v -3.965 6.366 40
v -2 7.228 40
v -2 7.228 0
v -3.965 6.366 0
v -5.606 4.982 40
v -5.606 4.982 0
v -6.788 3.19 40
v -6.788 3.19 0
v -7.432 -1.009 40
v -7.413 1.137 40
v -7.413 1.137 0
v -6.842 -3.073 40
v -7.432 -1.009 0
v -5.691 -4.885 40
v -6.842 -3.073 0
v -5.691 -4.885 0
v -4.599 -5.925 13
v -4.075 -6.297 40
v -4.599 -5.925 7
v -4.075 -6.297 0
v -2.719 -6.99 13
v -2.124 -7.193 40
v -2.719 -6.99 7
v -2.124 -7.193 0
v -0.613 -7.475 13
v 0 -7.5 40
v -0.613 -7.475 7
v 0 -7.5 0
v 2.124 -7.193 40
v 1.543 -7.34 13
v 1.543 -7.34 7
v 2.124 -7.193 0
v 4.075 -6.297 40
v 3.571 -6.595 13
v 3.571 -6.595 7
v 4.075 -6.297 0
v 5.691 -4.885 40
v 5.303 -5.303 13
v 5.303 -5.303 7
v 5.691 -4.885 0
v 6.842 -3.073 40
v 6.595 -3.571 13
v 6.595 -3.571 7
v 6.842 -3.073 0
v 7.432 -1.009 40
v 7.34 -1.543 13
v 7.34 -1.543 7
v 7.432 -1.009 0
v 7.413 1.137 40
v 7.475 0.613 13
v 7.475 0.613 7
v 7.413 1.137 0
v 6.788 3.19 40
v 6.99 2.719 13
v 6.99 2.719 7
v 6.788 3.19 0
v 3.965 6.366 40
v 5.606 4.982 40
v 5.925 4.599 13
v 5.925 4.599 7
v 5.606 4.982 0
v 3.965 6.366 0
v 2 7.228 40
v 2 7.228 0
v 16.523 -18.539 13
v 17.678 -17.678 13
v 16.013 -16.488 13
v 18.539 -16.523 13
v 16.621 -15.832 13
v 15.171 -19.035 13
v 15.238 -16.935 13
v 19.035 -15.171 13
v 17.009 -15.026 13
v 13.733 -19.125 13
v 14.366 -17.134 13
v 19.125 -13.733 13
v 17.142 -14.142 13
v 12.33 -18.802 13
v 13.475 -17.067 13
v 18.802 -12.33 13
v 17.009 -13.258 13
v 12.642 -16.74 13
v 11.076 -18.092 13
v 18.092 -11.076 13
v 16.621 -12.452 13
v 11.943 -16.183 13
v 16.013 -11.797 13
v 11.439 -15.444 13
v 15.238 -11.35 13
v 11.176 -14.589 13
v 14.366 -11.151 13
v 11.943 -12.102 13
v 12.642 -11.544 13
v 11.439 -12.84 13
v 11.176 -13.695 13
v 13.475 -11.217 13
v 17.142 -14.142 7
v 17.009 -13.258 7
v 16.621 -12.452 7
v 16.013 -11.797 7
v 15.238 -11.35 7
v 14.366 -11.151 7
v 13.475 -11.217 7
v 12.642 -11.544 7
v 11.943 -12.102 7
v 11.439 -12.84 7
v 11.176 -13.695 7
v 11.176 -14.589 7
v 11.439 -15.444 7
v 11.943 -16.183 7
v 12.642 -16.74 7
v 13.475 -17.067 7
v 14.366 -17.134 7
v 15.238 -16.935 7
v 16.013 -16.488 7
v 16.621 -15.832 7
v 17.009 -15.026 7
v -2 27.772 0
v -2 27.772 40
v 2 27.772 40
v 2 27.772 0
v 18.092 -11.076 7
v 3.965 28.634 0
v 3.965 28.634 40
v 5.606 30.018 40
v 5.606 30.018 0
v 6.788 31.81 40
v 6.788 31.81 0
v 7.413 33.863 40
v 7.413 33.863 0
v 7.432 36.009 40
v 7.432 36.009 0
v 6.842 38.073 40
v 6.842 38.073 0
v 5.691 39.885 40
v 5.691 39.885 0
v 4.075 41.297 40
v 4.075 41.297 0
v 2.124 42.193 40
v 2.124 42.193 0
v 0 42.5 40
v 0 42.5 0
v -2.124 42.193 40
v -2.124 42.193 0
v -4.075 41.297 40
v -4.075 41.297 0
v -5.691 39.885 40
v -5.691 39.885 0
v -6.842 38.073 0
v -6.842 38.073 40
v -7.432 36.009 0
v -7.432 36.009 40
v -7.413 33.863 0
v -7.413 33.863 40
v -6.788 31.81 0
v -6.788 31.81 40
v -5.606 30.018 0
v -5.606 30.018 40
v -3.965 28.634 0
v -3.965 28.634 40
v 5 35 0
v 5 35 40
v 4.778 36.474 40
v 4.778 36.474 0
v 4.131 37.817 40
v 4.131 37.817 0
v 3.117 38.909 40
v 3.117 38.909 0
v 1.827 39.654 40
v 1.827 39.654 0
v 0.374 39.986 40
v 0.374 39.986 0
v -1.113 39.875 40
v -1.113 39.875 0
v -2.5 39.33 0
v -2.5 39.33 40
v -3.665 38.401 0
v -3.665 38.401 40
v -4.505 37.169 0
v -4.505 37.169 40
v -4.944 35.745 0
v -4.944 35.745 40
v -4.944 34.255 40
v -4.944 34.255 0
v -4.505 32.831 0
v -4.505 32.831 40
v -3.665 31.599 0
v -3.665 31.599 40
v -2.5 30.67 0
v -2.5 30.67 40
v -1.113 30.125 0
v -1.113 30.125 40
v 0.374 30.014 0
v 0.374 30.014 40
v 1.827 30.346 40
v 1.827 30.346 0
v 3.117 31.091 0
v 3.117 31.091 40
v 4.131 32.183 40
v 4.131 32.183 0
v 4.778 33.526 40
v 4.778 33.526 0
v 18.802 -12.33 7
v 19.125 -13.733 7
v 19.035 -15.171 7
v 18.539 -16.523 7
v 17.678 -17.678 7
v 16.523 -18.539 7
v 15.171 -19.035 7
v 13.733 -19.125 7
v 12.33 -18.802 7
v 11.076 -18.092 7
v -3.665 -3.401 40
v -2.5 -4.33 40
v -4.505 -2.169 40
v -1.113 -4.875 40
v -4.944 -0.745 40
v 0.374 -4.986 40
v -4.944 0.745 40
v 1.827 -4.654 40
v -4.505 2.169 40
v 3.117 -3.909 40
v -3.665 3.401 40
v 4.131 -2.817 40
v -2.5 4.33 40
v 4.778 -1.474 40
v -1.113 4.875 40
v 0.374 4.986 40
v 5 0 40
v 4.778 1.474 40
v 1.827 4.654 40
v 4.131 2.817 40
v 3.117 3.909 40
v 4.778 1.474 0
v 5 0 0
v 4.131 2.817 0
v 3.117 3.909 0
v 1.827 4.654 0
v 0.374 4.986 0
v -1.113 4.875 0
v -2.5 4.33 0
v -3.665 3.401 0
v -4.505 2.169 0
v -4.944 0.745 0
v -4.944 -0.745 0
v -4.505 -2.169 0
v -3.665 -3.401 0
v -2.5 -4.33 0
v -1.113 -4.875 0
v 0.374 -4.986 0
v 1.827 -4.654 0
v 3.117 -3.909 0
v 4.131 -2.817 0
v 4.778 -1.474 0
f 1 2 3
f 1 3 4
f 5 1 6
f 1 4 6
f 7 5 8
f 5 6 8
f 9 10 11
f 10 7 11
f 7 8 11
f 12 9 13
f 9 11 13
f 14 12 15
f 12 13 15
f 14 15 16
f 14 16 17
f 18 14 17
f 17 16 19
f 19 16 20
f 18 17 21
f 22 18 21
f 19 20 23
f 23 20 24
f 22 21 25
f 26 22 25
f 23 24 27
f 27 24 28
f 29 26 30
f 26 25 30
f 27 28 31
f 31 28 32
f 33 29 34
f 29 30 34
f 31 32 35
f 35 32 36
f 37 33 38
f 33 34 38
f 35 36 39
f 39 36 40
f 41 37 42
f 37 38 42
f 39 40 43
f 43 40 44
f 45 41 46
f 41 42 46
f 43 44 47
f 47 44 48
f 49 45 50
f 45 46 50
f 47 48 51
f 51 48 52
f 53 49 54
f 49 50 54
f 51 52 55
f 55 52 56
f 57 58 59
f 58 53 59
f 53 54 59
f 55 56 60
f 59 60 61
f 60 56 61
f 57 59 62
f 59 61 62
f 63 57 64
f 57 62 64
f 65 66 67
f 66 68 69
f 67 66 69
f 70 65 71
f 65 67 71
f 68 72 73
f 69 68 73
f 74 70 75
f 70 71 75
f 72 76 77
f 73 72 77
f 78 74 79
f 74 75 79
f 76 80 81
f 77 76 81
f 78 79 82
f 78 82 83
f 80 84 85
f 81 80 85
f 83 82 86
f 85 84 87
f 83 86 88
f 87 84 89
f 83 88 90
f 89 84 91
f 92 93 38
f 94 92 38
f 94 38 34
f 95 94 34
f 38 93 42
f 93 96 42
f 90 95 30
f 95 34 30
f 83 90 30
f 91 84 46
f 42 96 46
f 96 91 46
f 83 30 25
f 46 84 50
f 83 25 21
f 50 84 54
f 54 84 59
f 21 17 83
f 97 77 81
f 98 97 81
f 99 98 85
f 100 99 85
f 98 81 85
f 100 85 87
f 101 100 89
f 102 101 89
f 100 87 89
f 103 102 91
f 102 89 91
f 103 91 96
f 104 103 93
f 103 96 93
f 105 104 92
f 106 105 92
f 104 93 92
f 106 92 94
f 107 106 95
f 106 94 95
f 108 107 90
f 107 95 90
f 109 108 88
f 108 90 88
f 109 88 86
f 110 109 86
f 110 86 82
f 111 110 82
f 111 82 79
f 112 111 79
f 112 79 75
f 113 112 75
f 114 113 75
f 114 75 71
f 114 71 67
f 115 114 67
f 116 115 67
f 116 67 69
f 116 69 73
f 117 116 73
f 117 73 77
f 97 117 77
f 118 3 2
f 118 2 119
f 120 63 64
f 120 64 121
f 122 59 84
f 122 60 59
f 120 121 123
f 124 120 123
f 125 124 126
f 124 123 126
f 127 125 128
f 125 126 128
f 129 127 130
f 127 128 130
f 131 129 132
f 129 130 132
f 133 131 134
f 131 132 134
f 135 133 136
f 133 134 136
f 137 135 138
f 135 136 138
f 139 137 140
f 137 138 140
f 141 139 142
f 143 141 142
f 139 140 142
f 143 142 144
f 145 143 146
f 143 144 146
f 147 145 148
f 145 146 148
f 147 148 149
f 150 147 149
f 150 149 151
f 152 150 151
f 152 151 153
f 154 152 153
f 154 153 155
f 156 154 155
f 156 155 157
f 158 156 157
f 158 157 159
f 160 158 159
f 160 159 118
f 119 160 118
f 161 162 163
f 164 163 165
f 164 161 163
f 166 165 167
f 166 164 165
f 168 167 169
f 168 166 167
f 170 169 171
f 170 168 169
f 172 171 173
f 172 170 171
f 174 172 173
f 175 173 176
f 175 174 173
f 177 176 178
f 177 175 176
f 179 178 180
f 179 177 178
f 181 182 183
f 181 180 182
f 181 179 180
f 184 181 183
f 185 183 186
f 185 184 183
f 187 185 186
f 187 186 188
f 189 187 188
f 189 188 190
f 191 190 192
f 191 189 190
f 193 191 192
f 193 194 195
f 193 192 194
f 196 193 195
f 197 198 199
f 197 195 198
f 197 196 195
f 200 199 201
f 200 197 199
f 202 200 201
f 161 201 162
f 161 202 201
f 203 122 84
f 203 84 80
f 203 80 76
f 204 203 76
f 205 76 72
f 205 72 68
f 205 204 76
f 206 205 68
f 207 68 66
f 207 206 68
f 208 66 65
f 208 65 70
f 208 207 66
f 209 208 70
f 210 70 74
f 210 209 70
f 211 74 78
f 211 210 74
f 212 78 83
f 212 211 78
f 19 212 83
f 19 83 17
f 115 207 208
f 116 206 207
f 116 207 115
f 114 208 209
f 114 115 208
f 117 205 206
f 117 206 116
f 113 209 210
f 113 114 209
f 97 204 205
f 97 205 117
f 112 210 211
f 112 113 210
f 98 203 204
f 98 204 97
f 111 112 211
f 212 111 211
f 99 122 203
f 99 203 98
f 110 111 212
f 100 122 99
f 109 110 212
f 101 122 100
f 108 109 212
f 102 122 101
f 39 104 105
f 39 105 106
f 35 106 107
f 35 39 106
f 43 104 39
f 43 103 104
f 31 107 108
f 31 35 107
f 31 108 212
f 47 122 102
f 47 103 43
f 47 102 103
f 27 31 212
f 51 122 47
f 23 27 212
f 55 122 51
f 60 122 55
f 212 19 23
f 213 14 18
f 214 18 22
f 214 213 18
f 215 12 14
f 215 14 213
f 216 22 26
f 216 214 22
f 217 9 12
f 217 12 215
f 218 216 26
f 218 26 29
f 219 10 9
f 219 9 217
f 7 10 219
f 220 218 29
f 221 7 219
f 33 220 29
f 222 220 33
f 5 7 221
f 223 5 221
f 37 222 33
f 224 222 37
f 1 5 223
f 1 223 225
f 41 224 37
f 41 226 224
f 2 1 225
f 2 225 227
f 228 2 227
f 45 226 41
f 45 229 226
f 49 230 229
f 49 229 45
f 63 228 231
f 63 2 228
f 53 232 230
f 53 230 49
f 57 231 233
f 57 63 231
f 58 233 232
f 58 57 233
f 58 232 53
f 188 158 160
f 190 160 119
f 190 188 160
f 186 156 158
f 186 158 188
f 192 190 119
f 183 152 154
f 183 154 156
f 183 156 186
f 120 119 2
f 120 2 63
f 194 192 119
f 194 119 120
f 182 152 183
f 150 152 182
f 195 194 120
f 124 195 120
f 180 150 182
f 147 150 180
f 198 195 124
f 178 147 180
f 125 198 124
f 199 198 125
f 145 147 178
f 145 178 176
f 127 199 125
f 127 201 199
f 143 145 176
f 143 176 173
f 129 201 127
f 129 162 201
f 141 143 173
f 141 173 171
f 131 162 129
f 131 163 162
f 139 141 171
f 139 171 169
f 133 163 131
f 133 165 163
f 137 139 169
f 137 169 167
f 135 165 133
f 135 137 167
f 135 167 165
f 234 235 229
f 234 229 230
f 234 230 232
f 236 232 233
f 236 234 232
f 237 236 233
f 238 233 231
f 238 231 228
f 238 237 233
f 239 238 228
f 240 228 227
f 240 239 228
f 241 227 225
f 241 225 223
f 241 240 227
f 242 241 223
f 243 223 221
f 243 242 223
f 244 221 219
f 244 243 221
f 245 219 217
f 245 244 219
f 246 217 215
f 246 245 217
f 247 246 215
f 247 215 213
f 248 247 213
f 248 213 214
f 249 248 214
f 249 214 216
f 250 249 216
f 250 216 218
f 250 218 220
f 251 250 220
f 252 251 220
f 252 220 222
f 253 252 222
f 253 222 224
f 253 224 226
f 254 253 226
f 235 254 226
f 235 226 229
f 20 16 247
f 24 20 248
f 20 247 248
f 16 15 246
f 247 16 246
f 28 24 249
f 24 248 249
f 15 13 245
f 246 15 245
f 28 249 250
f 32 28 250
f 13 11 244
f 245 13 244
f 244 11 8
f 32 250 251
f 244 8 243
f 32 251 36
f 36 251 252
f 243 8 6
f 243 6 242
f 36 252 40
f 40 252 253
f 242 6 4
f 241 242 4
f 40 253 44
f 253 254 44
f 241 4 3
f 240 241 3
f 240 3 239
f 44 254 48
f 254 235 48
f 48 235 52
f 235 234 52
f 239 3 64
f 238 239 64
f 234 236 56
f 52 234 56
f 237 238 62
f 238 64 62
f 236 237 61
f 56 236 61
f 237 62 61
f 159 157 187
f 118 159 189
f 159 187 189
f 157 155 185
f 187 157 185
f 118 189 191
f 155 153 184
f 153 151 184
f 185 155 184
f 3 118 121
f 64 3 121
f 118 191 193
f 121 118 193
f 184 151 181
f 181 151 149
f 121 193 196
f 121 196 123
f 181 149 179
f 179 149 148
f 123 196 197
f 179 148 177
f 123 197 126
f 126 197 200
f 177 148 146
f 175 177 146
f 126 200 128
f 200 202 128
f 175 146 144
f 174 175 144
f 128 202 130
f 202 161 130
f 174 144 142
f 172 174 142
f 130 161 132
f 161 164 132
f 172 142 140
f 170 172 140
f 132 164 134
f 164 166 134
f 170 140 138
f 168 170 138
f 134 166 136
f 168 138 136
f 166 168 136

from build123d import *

# Parameters (mm, degrees)
SKETCH_1_R          = 7.5
SKETCH_1_R_2        = 5
SKETCH_1_W          = 4
SKETCH_1_H          = 25
EXTRUDE_1_DEPTH     = 40
SKETCH_3_R          = 5
EXTRUDE_2_DEPTH     = 3
SKETCH_4_R          = 3
CUT_EXTRUDE_2_DEPTH = 54.867163989


with BuildPart() as part:
    # Эскиз1 → Бобышка-Вытянуть1 (new body)
    # profile 1 of 3: a face of its own
    with BuildSketch(Plane.XY):
        Circle(SKETCH_1_R)
        Circle(SKETCH_1_R_2, mode=Mode.SUBTRACT)
    # profile 2 of 3: a face of its own
    with BuildSketch(Plane.XY):
        with Locations((0, 35)):
            Circle(SKETCH_1_R)
        with Locations((0, 35)):
            Circle(SKETCH_1_R_2, mode=Mode.SUBTRACT)
    # profile 3 of 3: a face of its own
    with BuildSketch(Plane.XY):
        with Locations((0, 17.5)):
            Rectangle(SKETCH_1_W, SKETCH_1_H)
    extrude(amount=EXTRUDE_1_DEPTH)

    # Эскиз3 → Бобышка-Вытянуть2 (add, symmetric)
    with BuildSketch(Plane(origin=(0, 0, 10), x_dir=(-1, 0, 0), z_dir=(0, 0, -1))):
        with BuildLine():
            Line((-5.924618308, 4.598793093), (-18.091881162, -11.076273562))
            ThreePointArc((-18.091881162, -11.076273562), (-12.52175414, -9.411980886), (-9.142135624, -14.142135624))
            ThreePointArc((-9.142135624, -14.142135624), (-9.651628397, -16.34107738), (-11.076273562, -18.091881162))
            Line((-11.076273562, -18.091881162), (4.598793093, -5.924618308))
            Line((4.598793093, -5.924618308), (3.065862062, -3.949745538))
            ThreePointArc((3.065862062, -3.949745538), (-3.535533906, -3.535533906), (-3.949745538, 3.065862062))
            Line((-3.949745538, 3.065862062), (-5.924618308, 4.598793093))
        make_face()
        with Locations((-14.142135624, -14.142135624)):
            Circle(SKETCH_3_R)
    extrude(amount=EXTRUDE_2_DEPTH, both=True)

    # Эскиз4 → Вырез-Вытянуть2 (cut, through all)
    with BuildSketch(Plane.XY.offset(13)):
        with Locations((14.142135624, -14.142135624)):
            Circle(SKETCH_4_R)
    extrude(amount=-CUT_EXTRUDE_2_DEPTH, mode=Mode.SUBTRACT)


solid = part.part
